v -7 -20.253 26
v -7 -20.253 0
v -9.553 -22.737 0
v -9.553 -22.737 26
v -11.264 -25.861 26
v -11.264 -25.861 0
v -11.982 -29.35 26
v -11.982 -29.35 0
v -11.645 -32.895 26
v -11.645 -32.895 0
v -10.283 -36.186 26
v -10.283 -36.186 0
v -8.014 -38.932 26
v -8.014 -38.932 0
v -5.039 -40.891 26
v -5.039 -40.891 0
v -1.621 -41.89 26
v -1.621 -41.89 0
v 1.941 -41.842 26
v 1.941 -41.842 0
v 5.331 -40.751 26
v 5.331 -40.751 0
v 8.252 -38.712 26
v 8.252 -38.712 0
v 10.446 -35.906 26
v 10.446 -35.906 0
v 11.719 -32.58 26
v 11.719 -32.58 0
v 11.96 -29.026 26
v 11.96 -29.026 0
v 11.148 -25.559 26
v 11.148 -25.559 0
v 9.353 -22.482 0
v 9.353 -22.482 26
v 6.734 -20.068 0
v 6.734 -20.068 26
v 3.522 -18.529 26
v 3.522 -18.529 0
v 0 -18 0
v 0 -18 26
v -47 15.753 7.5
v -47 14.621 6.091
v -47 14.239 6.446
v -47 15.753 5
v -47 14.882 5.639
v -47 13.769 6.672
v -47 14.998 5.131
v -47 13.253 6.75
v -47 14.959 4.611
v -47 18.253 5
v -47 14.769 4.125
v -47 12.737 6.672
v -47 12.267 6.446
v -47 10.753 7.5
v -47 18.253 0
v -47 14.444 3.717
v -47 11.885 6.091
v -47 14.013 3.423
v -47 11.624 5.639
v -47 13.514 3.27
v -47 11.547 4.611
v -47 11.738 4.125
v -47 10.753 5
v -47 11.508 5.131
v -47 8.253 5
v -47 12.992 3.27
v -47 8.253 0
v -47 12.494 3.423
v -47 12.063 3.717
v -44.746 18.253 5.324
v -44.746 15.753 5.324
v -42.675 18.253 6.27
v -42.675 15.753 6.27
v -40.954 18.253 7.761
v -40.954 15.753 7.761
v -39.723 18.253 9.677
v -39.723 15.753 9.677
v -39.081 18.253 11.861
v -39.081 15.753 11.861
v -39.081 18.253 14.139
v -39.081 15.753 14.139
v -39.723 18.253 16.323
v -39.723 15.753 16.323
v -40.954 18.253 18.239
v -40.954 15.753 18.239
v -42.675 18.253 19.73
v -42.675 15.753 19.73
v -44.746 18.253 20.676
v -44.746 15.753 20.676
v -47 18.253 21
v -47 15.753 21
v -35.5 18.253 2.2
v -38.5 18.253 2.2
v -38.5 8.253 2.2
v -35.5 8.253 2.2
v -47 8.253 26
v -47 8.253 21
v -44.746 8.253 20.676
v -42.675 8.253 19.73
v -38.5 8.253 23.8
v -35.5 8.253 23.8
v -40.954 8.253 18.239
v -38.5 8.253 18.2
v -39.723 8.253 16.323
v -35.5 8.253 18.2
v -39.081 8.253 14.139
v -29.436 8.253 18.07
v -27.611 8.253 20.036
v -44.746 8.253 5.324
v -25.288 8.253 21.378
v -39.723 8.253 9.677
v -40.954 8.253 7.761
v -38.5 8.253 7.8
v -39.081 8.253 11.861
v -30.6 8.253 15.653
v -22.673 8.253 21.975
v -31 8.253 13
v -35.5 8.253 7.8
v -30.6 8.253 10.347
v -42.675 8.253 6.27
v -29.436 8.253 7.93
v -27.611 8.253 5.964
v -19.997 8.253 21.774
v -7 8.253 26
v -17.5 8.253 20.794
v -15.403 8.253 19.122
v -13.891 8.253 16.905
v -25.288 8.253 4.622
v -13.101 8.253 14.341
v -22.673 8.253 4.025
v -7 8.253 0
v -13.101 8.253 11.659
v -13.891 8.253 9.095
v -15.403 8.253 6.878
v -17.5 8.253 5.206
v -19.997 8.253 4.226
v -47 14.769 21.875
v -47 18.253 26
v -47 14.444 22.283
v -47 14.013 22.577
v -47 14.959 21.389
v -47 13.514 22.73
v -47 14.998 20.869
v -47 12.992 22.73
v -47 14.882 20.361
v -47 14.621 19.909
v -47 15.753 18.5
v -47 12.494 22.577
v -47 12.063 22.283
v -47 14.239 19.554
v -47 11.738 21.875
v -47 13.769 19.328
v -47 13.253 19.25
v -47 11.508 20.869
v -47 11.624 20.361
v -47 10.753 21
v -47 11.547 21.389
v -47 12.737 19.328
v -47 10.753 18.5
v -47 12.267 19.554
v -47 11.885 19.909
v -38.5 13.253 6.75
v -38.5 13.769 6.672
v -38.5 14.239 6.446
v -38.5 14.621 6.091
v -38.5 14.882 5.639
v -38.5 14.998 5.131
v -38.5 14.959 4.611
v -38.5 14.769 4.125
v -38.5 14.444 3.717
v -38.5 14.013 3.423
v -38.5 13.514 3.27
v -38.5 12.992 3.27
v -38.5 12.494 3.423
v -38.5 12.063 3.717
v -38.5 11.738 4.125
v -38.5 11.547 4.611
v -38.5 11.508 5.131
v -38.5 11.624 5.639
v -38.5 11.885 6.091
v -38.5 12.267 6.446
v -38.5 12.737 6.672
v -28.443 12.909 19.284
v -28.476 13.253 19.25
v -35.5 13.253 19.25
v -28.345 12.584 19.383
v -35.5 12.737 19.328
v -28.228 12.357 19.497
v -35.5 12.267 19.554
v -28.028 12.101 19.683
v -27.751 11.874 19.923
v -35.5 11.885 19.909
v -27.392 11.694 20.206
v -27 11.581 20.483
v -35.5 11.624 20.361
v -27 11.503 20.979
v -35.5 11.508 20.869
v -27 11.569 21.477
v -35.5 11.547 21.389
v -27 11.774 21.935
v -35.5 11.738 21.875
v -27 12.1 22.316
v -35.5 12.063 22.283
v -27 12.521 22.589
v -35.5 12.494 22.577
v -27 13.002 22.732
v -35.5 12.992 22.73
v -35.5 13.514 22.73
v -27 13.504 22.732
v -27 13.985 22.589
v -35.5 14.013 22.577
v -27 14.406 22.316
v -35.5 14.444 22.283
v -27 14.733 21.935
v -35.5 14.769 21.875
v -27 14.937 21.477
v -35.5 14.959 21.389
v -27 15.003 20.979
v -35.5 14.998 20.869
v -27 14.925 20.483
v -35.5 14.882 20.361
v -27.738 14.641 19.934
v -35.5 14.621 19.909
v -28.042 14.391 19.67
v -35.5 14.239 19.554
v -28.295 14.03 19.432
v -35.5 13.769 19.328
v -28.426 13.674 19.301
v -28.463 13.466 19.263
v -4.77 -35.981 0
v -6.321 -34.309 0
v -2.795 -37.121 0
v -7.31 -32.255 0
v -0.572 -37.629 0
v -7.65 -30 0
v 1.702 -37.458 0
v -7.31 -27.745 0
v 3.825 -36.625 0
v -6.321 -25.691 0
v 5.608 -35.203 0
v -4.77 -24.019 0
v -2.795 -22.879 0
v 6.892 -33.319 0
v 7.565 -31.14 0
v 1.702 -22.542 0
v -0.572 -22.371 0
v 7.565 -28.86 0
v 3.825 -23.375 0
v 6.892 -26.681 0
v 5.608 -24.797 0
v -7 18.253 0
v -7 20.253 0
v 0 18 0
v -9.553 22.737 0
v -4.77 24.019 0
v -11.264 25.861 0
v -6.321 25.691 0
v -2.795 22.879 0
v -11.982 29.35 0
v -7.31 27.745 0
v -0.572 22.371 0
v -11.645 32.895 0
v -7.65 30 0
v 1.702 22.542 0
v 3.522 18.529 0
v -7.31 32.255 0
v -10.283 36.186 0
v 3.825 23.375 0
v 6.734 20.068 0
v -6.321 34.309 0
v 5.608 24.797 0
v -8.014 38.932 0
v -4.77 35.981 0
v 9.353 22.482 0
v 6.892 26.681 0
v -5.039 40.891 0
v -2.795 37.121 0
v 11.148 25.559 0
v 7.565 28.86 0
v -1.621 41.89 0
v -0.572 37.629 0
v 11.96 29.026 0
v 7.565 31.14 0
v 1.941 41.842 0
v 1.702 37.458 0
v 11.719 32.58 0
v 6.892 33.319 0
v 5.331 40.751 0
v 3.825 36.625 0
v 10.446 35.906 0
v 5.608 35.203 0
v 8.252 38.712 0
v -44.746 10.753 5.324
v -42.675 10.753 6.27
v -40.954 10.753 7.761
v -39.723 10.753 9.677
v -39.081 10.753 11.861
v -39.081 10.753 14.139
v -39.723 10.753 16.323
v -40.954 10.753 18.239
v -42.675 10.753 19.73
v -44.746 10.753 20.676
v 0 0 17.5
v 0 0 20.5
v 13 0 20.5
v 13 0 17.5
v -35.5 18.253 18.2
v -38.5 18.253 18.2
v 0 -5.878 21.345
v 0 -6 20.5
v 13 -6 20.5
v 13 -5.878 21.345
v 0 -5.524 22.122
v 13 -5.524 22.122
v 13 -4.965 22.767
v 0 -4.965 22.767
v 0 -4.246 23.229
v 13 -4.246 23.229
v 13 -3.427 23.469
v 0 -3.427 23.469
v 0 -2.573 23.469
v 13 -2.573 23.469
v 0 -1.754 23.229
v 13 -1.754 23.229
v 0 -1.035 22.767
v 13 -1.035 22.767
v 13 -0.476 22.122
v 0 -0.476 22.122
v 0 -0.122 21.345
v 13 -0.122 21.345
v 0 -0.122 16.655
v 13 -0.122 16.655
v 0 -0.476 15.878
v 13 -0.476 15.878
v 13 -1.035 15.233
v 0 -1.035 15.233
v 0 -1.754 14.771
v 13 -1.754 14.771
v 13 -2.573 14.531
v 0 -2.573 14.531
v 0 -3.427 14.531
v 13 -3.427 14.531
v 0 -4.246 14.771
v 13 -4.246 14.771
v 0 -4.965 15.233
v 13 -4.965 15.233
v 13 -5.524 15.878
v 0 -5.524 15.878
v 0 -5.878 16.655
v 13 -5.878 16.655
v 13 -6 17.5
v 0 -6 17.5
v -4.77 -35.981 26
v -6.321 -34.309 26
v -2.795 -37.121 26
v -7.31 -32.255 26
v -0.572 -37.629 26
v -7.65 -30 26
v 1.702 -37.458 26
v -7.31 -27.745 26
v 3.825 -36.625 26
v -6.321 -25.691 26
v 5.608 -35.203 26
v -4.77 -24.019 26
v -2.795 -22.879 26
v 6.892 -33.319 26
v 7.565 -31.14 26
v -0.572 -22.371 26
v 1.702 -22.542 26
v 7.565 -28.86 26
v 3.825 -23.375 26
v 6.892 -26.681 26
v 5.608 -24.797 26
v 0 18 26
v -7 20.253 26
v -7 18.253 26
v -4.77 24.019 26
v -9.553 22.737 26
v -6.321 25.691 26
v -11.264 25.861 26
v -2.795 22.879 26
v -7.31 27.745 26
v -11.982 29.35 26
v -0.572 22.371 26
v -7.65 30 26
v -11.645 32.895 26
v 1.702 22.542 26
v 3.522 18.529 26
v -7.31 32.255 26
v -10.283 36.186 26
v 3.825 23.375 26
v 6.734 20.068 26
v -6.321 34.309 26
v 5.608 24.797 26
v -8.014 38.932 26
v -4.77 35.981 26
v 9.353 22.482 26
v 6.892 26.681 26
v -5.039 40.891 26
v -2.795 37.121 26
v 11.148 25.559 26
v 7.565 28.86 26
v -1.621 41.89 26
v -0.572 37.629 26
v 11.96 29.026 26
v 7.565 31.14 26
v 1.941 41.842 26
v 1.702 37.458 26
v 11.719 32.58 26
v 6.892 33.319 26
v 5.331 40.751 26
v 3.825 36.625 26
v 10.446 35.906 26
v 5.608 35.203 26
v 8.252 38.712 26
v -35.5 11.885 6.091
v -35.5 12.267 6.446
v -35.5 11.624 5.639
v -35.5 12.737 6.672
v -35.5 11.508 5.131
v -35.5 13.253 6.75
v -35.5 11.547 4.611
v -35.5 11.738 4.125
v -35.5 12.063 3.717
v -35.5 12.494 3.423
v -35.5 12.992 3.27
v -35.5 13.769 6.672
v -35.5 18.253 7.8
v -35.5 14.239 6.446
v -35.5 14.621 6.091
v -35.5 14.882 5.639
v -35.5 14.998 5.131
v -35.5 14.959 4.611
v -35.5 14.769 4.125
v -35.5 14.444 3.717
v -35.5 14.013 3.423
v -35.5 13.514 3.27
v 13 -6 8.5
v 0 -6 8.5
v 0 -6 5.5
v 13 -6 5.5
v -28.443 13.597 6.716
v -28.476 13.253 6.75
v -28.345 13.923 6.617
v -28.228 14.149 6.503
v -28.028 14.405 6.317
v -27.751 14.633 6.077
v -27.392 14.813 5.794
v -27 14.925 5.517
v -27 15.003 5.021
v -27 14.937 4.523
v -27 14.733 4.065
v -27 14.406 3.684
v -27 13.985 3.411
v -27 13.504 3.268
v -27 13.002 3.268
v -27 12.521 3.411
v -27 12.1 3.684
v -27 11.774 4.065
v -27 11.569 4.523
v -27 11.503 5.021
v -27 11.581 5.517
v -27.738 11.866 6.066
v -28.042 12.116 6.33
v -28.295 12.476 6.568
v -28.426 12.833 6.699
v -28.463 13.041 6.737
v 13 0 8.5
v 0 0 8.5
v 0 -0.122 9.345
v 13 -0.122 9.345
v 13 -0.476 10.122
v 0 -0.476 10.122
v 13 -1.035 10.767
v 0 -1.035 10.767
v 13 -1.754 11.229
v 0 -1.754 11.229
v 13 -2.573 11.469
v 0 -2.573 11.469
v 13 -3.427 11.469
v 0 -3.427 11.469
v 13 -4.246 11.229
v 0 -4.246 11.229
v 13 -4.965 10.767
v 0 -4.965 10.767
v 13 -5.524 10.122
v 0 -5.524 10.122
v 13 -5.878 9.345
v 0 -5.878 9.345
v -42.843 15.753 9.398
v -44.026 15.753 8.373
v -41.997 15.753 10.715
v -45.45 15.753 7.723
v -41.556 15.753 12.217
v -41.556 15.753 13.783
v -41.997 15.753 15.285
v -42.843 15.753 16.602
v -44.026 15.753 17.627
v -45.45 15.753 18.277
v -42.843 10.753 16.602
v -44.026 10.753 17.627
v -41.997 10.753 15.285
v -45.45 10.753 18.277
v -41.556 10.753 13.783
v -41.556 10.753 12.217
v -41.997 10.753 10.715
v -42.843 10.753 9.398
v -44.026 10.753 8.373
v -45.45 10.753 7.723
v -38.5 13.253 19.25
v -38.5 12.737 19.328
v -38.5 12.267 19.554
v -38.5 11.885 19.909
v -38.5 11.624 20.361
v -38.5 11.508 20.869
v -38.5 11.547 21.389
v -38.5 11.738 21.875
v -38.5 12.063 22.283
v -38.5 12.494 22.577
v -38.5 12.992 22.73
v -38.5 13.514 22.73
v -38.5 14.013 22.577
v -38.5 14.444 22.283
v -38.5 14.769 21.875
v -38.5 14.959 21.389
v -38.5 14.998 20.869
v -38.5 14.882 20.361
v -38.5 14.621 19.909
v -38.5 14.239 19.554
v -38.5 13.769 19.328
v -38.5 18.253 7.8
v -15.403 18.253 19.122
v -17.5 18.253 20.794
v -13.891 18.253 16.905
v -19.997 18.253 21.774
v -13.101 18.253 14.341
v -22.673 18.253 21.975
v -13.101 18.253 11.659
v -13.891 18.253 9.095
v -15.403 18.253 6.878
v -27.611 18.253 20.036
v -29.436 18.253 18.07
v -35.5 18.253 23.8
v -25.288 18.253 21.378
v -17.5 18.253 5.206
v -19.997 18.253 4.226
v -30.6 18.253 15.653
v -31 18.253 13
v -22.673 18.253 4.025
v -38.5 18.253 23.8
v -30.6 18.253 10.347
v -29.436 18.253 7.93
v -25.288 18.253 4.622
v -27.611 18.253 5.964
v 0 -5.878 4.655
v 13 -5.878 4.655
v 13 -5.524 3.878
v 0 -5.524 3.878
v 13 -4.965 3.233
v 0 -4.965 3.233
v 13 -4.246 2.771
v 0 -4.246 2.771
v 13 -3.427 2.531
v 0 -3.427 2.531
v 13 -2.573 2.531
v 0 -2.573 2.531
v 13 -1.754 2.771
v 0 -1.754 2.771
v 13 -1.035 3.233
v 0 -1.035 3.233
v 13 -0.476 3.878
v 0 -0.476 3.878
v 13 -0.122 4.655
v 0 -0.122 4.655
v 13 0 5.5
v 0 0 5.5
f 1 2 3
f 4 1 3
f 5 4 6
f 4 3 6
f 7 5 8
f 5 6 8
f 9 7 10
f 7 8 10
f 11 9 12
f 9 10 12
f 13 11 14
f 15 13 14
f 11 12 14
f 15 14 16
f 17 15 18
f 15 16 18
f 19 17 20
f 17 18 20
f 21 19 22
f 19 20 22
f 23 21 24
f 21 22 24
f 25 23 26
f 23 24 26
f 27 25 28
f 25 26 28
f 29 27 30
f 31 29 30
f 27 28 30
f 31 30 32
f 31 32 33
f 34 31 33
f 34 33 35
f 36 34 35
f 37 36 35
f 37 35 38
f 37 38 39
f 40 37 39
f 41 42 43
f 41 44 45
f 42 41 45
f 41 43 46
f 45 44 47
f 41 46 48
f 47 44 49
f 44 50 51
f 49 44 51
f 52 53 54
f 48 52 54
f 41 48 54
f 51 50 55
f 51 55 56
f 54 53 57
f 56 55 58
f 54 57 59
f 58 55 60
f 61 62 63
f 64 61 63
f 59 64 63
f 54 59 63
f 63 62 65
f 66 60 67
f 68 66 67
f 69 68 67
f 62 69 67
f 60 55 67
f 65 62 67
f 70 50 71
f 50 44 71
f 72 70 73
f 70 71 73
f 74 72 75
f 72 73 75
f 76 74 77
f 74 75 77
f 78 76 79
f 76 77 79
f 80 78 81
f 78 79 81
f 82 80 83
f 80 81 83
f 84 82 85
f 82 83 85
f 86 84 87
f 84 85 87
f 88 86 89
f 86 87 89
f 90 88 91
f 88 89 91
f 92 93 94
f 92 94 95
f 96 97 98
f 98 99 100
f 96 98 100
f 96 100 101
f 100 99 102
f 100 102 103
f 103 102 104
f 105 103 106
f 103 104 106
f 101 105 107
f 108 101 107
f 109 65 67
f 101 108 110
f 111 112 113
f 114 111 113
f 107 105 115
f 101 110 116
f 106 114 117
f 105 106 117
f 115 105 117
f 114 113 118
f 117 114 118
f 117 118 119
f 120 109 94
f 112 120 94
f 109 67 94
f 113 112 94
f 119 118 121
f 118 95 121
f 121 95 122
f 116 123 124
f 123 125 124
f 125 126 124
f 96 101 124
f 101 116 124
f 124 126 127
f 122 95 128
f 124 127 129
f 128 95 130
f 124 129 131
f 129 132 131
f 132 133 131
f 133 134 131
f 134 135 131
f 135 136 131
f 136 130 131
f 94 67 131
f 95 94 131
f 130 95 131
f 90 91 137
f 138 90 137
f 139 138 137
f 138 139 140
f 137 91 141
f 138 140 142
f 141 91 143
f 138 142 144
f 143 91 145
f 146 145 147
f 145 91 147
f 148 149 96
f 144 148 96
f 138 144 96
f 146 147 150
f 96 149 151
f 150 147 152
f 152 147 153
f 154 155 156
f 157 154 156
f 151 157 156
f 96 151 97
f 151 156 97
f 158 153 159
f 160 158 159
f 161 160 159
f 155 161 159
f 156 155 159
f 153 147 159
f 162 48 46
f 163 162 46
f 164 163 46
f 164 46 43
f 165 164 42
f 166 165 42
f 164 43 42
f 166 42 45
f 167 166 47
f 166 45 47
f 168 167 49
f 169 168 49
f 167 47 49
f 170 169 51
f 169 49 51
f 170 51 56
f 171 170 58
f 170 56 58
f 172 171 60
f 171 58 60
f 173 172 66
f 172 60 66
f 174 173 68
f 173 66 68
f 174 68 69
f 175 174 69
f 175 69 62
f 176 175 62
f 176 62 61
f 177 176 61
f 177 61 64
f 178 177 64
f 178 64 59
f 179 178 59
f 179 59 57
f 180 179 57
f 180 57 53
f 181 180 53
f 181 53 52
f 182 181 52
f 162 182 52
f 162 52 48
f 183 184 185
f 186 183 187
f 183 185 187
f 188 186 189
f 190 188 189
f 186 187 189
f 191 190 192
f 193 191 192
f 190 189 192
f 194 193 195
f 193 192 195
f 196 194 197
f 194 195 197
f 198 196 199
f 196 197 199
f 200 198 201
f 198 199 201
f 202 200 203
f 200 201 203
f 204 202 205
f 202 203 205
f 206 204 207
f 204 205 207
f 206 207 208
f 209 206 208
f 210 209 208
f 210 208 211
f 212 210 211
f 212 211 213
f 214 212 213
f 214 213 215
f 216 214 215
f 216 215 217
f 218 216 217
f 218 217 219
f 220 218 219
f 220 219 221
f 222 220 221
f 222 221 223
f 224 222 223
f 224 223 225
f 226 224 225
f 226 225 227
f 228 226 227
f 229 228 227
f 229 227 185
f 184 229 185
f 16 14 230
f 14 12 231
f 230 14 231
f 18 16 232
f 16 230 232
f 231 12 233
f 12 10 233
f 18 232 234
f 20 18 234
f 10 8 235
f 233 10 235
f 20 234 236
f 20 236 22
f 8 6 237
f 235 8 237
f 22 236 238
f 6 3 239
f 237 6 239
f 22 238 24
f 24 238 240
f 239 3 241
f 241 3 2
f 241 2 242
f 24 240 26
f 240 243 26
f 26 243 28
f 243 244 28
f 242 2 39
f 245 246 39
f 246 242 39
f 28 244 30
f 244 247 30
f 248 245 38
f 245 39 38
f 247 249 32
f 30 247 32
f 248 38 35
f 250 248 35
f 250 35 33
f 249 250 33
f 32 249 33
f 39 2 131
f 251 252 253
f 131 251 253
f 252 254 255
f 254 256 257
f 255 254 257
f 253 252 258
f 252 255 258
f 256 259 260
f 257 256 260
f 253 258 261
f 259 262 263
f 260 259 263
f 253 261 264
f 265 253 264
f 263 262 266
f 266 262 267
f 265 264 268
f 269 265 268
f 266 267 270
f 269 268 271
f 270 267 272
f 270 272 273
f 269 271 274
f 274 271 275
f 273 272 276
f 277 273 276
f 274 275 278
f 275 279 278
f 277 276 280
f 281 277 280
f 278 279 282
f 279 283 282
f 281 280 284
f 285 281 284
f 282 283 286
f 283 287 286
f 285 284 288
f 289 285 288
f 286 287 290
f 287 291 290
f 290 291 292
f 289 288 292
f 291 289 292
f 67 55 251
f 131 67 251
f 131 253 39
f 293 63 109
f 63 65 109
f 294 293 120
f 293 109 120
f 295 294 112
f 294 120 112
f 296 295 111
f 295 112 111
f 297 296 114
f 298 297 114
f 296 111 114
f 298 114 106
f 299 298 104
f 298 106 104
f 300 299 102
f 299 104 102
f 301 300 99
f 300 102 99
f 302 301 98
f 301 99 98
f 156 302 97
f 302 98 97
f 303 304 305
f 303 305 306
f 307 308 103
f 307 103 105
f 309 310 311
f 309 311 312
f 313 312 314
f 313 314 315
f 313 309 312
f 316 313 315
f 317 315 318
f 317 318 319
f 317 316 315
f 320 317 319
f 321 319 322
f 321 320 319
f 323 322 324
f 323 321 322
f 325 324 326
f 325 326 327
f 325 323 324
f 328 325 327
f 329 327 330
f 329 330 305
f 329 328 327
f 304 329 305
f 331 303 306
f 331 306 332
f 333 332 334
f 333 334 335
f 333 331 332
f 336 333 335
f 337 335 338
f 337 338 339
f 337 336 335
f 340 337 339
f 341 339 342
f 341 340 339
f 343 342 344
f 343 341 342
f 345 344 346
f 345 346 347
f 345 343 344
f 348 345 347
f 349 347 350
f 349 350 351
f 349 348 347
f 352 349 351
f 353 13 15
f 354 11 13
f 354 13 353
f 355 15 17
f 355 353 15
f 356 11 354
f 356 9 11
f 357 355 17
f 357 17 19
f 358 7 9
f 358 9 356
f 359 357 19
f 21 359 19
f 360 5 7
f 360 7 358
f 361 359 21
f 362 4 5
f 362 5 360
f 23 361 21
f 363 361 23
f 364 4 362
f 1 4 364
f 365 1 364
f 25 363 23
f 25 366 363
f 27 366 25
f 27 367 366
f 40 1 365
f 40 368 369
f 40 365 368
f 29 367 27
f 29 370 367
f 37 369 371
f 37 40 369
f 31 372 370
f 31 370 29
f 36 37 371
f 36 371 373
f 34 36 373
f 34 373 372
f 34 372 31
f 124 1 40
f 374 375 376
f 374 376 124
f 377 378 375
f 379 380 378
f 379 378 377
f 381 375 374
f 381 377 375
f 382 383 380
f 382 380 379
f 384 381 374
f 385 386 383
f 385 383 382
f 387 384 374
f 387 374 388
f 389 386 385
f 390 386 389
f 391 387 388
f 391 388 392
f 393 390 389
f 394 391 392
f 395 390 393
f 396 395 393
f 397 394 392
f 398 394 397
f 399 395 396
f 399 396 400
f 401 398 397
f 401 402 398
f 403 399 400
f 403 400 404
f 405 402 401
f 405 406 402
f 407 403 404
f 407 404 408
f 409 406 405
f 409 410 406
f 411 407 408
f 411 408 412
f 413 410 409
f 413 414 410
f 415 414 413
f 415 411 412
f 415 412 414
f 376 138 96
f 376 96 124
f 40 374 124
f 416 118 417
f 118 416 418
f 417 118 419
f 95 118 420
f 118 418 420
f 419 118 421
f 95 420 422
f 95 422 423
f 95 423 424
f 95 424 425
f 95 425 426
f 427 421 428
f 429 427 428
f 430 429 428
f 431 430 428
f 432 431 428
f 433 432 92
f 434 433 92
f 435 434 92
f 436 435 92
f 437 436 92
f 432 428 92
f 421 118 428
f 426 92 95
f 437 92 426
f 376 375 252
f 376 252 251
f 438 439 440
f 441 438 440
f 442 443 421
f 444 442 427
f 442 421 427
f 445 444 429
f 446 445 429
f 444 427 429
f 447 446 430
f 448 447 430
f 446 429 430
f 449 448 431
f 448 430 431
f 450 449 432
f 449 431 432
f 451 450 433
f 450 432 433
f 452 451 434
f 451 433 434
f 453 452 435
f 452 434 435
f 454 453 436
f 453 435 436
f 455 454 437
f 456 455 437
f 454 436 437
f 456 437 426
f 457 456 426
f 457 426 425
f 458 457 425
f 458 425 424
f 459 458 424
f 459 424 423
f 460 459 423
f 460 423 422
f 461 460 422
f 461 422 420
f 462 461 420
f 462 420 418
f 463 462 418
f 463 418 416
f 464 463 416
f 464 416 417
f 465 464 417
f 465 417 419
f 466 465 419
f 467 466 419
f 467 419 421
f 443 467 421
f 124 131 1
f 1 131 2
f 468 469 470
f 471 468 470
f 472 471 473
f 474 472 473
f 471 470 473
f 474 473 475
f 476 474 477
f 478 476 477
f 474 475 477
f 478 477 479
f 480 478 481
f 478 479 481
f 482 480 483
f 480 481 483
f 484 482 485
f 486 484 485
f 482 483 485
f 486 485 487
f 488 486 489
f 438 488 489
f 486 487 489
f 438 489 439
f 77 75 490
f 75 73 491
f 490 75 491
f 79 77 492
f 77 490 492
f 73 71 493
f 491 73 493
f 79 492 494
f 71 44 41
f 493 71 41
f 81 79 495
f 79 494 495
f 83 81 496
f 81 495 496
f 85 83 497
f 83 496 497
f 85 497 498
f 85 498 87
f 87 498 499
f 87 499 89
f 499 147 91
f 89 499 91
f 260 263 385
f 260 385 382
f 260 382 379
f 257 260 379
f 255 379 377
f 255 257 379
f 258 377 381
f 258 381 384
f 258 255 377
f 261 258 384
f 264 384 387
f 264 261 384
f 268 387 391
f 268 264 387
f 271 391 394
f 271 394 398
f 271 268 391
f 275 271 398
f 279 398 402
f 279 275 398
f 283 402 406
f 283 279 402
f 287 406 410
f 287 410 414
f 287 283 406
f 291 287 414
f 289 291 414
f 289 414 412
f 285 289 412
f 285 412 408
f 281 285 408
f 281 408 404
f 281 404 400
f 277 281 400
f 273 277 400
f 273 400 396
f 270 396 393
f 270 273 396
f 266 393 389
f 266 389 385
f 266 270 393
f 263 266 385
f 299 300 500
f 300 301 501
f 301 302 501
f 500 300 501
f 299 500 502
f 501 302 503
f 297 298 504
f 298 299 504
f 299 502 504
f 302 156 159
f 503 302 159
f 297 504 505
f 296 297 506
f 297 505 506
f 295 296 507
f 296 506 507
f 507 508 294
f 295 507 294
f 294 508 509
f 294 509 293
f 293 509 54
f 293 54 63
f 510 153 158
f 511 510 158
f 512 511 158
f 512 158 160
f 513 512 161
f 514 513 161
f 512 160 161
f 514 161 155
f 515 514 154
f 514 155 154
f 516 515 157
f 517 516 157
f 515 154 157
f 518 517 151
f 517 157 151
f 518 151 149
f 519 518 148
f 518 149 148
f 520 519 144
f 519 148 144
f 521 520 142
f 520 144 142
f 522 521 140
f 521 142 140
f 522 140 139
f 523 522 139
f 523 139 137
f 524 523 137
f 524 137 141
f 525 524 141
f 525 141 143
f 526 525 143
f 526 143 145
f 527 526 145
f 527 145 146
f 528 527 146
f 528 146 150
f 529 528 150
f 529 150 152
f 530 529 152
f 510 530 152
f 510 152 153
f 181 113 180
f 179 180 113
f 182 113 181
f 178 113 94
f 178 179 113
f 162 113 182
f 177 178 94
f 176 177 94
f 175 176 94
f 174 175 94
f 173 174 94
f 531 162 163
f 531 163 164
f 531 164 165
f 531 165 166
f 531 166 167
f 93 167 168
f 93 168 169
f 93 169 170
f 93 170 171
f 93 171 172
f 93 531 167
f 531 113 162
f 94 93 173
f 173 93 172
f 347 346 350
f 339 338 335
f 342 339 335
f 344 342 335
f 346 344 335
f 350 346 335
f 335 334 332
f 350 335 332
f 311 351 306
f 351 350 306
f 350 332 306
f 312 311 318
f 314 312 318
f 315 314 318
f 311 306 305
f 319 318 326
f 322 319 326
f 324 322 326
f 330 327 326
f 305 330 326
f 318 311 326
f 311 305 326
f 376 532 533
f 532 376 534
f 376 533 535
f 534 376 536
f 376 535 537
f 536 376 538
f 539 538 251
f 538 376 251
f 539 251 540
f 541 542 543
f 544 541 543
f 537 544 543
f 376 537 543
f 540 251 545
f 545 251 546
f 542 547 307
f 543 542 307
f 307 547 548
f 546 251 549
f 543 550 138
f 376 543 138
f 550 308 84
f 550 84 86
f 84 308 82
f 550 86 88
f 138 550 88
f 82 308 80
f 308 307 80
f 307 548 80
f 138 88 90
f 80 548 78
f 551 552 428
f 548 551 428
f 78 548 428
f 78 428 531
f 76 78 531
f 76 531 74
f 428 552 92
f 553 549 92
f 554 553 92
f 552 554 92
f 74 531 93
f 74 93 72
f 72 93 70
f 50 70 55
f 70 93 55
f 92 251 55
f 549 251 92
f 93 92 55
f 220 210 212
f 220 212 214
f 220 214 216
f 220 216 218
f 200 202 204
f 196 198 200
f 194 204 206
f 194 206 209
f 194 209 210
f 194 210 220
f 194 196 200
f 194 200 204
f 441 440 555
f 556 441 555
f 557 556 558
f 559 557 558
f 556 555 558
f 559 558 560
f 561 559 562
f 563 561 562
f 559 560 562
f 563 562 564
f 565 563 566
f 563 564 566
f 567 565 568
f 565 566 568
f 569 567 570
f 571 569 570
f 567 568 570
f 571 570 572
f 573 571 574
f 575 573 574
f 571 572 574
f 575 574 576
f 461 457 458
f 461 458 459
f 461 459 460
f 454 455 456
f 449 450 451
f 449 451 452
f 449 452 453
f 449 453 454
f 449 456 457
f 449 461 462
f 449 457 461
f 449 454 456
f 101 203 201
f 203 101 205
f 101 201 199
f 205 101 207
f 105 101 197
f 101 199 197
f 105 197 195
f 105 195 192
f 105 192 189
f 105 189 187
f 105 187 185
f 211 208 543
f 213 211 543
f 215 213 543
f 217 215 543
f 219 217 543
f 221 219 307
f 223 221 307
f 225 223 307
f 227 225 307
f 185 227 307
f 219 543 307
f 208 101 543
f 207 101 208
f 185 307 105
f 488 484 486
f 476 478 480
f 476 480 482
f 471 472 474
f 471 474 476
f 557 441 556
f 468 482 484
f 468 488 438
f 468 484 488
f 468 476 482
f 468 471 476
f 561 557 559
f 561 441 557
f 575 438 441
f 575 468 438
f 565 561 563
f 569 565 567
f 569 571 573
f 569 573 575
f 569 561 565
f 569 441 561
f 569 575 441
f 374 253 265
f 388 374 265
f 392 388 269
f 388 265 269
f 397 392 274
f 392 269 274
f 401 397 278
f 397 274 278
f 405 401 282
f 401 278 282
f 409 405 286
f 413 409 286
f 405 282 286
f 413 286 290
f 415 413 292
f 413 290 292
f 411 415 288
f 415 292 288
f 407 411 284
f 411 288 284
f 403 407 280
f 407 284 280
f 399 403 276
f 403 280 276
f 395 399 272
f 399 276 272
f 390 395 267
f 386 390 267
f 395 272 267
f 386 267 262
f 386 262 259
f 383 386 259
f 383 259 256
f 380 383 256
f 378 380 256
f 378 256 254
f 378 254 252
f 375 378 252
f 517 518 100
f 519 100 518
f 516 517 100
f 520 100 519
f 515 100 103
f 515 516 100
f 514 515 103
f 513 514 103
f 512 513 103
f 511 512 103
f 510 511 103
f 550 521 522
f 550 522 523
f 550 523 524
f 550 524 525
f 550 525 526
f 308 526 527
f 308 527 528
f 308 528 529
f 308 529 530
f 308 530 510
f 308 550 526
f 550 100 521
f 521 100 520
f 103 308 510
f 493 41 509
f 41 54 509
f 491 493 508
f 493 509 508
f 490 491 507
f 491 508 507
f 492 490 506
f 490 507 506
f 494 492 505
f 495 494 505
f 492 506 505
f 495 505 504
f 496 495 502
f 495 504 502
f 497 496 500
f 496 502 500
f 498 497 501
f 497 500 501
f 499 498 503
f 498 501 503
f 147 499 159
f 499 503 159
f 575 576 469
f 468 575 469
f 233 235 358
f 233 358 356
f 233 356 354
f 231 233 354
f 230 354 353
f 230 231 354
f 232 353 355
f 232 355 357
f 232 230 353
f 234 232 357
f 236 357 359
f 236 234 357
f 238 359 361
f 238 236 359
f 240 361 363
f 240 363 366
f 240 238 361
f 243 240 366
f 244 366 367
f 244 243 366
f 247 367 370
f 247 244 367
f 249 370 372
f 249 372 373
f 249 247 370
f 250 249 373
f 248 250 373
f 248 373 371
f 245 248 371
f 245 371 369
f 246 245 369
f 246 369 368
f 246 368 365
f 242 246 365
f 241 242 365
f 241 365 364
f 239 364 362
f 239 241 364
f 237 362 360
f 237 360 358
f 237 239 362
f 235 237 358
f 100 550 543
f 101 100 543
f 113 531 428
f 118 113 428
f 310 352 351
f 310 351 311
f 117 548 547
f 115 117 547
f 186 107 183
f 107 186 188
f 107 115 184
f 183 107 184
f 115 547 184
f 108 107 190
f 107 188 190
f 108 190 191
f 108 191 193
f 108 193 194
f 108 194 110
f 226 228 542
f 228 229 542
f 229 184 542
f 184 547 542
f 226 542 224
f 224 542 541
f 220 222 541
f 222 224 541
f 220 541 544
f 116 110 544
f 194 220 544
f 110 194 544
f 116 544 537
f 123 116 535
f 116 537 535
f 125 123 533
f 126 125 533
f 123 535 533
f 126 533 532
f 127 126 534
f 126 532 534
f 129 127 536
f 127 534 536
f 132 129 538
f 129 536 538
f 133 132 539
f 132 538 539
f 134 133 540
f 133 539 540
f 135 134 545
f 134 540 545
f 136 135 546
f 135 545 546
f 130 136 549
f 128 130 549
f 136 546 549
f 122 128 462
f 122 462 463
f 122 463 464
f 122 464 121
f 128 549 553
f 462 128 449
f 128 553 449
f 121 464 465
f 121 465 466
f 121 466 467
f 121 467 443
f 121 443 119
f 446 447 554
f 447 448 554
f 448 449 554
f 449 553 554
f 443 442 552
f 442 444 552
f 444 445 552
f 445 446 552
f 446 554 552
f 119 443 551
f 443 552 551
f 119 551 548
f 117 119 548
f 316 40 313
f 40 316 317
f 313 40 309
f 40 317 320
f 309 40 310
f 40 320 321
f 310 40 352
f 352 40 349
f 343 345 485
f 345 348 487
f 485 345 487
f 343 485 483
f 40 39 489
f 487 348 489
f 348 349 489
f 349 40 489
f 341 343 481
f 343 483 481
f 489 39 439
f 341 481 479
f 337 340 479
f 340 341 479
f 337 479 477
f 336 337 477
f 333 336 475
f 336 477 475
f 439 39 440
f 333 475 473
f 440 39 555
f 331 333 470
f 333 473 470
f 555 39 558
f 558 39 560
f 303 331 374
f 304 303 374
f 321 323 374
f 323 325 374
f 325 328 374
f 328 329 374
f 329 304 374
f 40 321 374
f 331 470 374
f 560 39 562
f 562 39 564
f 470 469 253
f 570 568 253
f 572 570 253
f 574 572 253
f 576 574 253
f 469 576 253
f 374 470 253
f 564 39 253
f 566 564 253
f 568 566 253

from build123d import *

# Parameters (mm, degrees)
ESBO_O1_R                = 7.65
RESSALTO_EXTRUS_O1_DEPTH = 26
ESBO_O4_R                = 1.75
CORTE_EXTRUS_O1_DEPTH    = 20
ESBO_O5_W                = 3
ESBO_O5_H                = 5.6
CORTE_EXTRUS_O2_DEPTH    = 25
RESSALTO_EXTRUS_O2_DEPTH = 13
ESBO_O7_R                = 9
CORTE_EXTRUS_O3_DEPTH    = 10


with BuildPart() as part:
    # Esboço1 → Ressalto-extrusão1 (new body)
    with BuildSketch(Plane.XY):
        with BuildLine():
            Line((-7, 20.253205655), (-7, 18.253205655))
            Line((-7, 18.253205655), (-47, 18.253205655))
            Line((-47, 18.253205655), (-47, 8.253205655))
            Line((-47, 8.253205655), (-7, 8.253205655))
            Line((-7, 8.253205655), (-7, -20.253205655))
            ThreePointArc((-7, -20.253205655), (3.676851089, -41.422817781), (0, -18))
            Line((0, -18), (0, 18))
            ThreePointArc((0, 18), (3.676851089, 41.422817781), (-7, 20.253205655))
        make_face()
        with Locations(Location((0, 30, 0), (0, 0, 180))):
            Circle(ESBO_O1_R, mode=Mode.SUBTRACT)
        with Locations(Location((0, -30, 0), (0, 0, 180))):
            Circle(ESBO_O1_R, mode=Mode.SUBTRACT)
    extrude(amount=RESSALTO_EXTRUS_O1_DEPTH)

    # Esboço3 → Corte-Revolução1 (revolve, cut)
    with BuildSketch(Plane.ZY.offset(47)):
        Polygon((13, 18.253205655), (21, 18.253205655), (21, 15.753205655), (18.5, 15.753205655), (18.5, 10.753205655), (21, 10.753205655), (21, 8.253205655), (13, 8.253205655), align=None)
    revolve(axis=Axis((-47, 18.253205655, 13), (0, -1, 0)), mode=Mode.SUBTRACT)

    # Esboço4 → Corte-extrusão1 (cut)
    with BuildSketch(Plane.ZY.offset(47)):
        with Locations((5, 13.253205655)):
            Circle(ESBO_O4_R)
        with Locations(Location((21, 13.253205655, 0), (0, 0, 180))):
            Circle(ESBO_O4_R)
    extrude(amount=-CORTE_EXTRUS_O1_DEPTH, mode=Mode.SUBTRACT)

    # Esboço5 → Corte-extrusão2 (cut)
    with BuildSketch(Plane(origin=(0, 18.253205655, 0), x_dir=(1, 0, 0), z_dir=(0, 1, 0))):
        with Locations((-37, -5)):
            Rectangle(ESBO_O5_W, ESBO_O5_H)
        with Locations((-37, -21)):
            Rectangle(ESBO_O5_W, ESBO_O5_H)
    extrude(amount=-CORTE_EXTRUS_O2_DEPTH, mode=Mode.SUBTRACT)

    # Esboço6 → Ressalto-extrusão2 (add)
    with BuildSketch(Plane(origin=(0, 0, 0), x_dir=(0, 0, -1), z_dir=(1, 0, 0))):
        with BuildLine():
            Line((-17.5, -6), (-20.5, -6))
            ThreePointArc((-20.5, -6), (-23.5, -3), (-20.5, 0))
            Line((-20.5, 0), (-17.5, 0))
            ThreePointArc((-17.5, 0), (-14.5, -3), (-17.5, -6))
        make_face()
        with BuildLine():
            Line((-8.5, -6), (-5.5, -6))
            ThreePointArc((-5.5, -6), (-2.5, -3), (-5.5, 0))
            Line((-5.5, 0), (-8.5, 0))
            ThreePointArc((-8.5, 0), (-11.5, -3), (-8.5, -6))
        make_face()
    extrude(amount=RESSALTO_EXTRUS_O2_DEPTH)

    # Esboço7 → Corte-extrusão3 (cut)
    with BuildSketch(Plane(origin=(0, 18.253205655, 0), x_dir=(1, 0, 0), z_dir=(0, 1, 0))):
        with Locations(Location((-22, -13, 0), (0, 0, 180))):
            Circle(ESBO_O7_R)
    extrude(amount=-CORTE_EXTRUS_O3_DEPTH, mode=Mode.SUBTRACT)


solid = part.part
